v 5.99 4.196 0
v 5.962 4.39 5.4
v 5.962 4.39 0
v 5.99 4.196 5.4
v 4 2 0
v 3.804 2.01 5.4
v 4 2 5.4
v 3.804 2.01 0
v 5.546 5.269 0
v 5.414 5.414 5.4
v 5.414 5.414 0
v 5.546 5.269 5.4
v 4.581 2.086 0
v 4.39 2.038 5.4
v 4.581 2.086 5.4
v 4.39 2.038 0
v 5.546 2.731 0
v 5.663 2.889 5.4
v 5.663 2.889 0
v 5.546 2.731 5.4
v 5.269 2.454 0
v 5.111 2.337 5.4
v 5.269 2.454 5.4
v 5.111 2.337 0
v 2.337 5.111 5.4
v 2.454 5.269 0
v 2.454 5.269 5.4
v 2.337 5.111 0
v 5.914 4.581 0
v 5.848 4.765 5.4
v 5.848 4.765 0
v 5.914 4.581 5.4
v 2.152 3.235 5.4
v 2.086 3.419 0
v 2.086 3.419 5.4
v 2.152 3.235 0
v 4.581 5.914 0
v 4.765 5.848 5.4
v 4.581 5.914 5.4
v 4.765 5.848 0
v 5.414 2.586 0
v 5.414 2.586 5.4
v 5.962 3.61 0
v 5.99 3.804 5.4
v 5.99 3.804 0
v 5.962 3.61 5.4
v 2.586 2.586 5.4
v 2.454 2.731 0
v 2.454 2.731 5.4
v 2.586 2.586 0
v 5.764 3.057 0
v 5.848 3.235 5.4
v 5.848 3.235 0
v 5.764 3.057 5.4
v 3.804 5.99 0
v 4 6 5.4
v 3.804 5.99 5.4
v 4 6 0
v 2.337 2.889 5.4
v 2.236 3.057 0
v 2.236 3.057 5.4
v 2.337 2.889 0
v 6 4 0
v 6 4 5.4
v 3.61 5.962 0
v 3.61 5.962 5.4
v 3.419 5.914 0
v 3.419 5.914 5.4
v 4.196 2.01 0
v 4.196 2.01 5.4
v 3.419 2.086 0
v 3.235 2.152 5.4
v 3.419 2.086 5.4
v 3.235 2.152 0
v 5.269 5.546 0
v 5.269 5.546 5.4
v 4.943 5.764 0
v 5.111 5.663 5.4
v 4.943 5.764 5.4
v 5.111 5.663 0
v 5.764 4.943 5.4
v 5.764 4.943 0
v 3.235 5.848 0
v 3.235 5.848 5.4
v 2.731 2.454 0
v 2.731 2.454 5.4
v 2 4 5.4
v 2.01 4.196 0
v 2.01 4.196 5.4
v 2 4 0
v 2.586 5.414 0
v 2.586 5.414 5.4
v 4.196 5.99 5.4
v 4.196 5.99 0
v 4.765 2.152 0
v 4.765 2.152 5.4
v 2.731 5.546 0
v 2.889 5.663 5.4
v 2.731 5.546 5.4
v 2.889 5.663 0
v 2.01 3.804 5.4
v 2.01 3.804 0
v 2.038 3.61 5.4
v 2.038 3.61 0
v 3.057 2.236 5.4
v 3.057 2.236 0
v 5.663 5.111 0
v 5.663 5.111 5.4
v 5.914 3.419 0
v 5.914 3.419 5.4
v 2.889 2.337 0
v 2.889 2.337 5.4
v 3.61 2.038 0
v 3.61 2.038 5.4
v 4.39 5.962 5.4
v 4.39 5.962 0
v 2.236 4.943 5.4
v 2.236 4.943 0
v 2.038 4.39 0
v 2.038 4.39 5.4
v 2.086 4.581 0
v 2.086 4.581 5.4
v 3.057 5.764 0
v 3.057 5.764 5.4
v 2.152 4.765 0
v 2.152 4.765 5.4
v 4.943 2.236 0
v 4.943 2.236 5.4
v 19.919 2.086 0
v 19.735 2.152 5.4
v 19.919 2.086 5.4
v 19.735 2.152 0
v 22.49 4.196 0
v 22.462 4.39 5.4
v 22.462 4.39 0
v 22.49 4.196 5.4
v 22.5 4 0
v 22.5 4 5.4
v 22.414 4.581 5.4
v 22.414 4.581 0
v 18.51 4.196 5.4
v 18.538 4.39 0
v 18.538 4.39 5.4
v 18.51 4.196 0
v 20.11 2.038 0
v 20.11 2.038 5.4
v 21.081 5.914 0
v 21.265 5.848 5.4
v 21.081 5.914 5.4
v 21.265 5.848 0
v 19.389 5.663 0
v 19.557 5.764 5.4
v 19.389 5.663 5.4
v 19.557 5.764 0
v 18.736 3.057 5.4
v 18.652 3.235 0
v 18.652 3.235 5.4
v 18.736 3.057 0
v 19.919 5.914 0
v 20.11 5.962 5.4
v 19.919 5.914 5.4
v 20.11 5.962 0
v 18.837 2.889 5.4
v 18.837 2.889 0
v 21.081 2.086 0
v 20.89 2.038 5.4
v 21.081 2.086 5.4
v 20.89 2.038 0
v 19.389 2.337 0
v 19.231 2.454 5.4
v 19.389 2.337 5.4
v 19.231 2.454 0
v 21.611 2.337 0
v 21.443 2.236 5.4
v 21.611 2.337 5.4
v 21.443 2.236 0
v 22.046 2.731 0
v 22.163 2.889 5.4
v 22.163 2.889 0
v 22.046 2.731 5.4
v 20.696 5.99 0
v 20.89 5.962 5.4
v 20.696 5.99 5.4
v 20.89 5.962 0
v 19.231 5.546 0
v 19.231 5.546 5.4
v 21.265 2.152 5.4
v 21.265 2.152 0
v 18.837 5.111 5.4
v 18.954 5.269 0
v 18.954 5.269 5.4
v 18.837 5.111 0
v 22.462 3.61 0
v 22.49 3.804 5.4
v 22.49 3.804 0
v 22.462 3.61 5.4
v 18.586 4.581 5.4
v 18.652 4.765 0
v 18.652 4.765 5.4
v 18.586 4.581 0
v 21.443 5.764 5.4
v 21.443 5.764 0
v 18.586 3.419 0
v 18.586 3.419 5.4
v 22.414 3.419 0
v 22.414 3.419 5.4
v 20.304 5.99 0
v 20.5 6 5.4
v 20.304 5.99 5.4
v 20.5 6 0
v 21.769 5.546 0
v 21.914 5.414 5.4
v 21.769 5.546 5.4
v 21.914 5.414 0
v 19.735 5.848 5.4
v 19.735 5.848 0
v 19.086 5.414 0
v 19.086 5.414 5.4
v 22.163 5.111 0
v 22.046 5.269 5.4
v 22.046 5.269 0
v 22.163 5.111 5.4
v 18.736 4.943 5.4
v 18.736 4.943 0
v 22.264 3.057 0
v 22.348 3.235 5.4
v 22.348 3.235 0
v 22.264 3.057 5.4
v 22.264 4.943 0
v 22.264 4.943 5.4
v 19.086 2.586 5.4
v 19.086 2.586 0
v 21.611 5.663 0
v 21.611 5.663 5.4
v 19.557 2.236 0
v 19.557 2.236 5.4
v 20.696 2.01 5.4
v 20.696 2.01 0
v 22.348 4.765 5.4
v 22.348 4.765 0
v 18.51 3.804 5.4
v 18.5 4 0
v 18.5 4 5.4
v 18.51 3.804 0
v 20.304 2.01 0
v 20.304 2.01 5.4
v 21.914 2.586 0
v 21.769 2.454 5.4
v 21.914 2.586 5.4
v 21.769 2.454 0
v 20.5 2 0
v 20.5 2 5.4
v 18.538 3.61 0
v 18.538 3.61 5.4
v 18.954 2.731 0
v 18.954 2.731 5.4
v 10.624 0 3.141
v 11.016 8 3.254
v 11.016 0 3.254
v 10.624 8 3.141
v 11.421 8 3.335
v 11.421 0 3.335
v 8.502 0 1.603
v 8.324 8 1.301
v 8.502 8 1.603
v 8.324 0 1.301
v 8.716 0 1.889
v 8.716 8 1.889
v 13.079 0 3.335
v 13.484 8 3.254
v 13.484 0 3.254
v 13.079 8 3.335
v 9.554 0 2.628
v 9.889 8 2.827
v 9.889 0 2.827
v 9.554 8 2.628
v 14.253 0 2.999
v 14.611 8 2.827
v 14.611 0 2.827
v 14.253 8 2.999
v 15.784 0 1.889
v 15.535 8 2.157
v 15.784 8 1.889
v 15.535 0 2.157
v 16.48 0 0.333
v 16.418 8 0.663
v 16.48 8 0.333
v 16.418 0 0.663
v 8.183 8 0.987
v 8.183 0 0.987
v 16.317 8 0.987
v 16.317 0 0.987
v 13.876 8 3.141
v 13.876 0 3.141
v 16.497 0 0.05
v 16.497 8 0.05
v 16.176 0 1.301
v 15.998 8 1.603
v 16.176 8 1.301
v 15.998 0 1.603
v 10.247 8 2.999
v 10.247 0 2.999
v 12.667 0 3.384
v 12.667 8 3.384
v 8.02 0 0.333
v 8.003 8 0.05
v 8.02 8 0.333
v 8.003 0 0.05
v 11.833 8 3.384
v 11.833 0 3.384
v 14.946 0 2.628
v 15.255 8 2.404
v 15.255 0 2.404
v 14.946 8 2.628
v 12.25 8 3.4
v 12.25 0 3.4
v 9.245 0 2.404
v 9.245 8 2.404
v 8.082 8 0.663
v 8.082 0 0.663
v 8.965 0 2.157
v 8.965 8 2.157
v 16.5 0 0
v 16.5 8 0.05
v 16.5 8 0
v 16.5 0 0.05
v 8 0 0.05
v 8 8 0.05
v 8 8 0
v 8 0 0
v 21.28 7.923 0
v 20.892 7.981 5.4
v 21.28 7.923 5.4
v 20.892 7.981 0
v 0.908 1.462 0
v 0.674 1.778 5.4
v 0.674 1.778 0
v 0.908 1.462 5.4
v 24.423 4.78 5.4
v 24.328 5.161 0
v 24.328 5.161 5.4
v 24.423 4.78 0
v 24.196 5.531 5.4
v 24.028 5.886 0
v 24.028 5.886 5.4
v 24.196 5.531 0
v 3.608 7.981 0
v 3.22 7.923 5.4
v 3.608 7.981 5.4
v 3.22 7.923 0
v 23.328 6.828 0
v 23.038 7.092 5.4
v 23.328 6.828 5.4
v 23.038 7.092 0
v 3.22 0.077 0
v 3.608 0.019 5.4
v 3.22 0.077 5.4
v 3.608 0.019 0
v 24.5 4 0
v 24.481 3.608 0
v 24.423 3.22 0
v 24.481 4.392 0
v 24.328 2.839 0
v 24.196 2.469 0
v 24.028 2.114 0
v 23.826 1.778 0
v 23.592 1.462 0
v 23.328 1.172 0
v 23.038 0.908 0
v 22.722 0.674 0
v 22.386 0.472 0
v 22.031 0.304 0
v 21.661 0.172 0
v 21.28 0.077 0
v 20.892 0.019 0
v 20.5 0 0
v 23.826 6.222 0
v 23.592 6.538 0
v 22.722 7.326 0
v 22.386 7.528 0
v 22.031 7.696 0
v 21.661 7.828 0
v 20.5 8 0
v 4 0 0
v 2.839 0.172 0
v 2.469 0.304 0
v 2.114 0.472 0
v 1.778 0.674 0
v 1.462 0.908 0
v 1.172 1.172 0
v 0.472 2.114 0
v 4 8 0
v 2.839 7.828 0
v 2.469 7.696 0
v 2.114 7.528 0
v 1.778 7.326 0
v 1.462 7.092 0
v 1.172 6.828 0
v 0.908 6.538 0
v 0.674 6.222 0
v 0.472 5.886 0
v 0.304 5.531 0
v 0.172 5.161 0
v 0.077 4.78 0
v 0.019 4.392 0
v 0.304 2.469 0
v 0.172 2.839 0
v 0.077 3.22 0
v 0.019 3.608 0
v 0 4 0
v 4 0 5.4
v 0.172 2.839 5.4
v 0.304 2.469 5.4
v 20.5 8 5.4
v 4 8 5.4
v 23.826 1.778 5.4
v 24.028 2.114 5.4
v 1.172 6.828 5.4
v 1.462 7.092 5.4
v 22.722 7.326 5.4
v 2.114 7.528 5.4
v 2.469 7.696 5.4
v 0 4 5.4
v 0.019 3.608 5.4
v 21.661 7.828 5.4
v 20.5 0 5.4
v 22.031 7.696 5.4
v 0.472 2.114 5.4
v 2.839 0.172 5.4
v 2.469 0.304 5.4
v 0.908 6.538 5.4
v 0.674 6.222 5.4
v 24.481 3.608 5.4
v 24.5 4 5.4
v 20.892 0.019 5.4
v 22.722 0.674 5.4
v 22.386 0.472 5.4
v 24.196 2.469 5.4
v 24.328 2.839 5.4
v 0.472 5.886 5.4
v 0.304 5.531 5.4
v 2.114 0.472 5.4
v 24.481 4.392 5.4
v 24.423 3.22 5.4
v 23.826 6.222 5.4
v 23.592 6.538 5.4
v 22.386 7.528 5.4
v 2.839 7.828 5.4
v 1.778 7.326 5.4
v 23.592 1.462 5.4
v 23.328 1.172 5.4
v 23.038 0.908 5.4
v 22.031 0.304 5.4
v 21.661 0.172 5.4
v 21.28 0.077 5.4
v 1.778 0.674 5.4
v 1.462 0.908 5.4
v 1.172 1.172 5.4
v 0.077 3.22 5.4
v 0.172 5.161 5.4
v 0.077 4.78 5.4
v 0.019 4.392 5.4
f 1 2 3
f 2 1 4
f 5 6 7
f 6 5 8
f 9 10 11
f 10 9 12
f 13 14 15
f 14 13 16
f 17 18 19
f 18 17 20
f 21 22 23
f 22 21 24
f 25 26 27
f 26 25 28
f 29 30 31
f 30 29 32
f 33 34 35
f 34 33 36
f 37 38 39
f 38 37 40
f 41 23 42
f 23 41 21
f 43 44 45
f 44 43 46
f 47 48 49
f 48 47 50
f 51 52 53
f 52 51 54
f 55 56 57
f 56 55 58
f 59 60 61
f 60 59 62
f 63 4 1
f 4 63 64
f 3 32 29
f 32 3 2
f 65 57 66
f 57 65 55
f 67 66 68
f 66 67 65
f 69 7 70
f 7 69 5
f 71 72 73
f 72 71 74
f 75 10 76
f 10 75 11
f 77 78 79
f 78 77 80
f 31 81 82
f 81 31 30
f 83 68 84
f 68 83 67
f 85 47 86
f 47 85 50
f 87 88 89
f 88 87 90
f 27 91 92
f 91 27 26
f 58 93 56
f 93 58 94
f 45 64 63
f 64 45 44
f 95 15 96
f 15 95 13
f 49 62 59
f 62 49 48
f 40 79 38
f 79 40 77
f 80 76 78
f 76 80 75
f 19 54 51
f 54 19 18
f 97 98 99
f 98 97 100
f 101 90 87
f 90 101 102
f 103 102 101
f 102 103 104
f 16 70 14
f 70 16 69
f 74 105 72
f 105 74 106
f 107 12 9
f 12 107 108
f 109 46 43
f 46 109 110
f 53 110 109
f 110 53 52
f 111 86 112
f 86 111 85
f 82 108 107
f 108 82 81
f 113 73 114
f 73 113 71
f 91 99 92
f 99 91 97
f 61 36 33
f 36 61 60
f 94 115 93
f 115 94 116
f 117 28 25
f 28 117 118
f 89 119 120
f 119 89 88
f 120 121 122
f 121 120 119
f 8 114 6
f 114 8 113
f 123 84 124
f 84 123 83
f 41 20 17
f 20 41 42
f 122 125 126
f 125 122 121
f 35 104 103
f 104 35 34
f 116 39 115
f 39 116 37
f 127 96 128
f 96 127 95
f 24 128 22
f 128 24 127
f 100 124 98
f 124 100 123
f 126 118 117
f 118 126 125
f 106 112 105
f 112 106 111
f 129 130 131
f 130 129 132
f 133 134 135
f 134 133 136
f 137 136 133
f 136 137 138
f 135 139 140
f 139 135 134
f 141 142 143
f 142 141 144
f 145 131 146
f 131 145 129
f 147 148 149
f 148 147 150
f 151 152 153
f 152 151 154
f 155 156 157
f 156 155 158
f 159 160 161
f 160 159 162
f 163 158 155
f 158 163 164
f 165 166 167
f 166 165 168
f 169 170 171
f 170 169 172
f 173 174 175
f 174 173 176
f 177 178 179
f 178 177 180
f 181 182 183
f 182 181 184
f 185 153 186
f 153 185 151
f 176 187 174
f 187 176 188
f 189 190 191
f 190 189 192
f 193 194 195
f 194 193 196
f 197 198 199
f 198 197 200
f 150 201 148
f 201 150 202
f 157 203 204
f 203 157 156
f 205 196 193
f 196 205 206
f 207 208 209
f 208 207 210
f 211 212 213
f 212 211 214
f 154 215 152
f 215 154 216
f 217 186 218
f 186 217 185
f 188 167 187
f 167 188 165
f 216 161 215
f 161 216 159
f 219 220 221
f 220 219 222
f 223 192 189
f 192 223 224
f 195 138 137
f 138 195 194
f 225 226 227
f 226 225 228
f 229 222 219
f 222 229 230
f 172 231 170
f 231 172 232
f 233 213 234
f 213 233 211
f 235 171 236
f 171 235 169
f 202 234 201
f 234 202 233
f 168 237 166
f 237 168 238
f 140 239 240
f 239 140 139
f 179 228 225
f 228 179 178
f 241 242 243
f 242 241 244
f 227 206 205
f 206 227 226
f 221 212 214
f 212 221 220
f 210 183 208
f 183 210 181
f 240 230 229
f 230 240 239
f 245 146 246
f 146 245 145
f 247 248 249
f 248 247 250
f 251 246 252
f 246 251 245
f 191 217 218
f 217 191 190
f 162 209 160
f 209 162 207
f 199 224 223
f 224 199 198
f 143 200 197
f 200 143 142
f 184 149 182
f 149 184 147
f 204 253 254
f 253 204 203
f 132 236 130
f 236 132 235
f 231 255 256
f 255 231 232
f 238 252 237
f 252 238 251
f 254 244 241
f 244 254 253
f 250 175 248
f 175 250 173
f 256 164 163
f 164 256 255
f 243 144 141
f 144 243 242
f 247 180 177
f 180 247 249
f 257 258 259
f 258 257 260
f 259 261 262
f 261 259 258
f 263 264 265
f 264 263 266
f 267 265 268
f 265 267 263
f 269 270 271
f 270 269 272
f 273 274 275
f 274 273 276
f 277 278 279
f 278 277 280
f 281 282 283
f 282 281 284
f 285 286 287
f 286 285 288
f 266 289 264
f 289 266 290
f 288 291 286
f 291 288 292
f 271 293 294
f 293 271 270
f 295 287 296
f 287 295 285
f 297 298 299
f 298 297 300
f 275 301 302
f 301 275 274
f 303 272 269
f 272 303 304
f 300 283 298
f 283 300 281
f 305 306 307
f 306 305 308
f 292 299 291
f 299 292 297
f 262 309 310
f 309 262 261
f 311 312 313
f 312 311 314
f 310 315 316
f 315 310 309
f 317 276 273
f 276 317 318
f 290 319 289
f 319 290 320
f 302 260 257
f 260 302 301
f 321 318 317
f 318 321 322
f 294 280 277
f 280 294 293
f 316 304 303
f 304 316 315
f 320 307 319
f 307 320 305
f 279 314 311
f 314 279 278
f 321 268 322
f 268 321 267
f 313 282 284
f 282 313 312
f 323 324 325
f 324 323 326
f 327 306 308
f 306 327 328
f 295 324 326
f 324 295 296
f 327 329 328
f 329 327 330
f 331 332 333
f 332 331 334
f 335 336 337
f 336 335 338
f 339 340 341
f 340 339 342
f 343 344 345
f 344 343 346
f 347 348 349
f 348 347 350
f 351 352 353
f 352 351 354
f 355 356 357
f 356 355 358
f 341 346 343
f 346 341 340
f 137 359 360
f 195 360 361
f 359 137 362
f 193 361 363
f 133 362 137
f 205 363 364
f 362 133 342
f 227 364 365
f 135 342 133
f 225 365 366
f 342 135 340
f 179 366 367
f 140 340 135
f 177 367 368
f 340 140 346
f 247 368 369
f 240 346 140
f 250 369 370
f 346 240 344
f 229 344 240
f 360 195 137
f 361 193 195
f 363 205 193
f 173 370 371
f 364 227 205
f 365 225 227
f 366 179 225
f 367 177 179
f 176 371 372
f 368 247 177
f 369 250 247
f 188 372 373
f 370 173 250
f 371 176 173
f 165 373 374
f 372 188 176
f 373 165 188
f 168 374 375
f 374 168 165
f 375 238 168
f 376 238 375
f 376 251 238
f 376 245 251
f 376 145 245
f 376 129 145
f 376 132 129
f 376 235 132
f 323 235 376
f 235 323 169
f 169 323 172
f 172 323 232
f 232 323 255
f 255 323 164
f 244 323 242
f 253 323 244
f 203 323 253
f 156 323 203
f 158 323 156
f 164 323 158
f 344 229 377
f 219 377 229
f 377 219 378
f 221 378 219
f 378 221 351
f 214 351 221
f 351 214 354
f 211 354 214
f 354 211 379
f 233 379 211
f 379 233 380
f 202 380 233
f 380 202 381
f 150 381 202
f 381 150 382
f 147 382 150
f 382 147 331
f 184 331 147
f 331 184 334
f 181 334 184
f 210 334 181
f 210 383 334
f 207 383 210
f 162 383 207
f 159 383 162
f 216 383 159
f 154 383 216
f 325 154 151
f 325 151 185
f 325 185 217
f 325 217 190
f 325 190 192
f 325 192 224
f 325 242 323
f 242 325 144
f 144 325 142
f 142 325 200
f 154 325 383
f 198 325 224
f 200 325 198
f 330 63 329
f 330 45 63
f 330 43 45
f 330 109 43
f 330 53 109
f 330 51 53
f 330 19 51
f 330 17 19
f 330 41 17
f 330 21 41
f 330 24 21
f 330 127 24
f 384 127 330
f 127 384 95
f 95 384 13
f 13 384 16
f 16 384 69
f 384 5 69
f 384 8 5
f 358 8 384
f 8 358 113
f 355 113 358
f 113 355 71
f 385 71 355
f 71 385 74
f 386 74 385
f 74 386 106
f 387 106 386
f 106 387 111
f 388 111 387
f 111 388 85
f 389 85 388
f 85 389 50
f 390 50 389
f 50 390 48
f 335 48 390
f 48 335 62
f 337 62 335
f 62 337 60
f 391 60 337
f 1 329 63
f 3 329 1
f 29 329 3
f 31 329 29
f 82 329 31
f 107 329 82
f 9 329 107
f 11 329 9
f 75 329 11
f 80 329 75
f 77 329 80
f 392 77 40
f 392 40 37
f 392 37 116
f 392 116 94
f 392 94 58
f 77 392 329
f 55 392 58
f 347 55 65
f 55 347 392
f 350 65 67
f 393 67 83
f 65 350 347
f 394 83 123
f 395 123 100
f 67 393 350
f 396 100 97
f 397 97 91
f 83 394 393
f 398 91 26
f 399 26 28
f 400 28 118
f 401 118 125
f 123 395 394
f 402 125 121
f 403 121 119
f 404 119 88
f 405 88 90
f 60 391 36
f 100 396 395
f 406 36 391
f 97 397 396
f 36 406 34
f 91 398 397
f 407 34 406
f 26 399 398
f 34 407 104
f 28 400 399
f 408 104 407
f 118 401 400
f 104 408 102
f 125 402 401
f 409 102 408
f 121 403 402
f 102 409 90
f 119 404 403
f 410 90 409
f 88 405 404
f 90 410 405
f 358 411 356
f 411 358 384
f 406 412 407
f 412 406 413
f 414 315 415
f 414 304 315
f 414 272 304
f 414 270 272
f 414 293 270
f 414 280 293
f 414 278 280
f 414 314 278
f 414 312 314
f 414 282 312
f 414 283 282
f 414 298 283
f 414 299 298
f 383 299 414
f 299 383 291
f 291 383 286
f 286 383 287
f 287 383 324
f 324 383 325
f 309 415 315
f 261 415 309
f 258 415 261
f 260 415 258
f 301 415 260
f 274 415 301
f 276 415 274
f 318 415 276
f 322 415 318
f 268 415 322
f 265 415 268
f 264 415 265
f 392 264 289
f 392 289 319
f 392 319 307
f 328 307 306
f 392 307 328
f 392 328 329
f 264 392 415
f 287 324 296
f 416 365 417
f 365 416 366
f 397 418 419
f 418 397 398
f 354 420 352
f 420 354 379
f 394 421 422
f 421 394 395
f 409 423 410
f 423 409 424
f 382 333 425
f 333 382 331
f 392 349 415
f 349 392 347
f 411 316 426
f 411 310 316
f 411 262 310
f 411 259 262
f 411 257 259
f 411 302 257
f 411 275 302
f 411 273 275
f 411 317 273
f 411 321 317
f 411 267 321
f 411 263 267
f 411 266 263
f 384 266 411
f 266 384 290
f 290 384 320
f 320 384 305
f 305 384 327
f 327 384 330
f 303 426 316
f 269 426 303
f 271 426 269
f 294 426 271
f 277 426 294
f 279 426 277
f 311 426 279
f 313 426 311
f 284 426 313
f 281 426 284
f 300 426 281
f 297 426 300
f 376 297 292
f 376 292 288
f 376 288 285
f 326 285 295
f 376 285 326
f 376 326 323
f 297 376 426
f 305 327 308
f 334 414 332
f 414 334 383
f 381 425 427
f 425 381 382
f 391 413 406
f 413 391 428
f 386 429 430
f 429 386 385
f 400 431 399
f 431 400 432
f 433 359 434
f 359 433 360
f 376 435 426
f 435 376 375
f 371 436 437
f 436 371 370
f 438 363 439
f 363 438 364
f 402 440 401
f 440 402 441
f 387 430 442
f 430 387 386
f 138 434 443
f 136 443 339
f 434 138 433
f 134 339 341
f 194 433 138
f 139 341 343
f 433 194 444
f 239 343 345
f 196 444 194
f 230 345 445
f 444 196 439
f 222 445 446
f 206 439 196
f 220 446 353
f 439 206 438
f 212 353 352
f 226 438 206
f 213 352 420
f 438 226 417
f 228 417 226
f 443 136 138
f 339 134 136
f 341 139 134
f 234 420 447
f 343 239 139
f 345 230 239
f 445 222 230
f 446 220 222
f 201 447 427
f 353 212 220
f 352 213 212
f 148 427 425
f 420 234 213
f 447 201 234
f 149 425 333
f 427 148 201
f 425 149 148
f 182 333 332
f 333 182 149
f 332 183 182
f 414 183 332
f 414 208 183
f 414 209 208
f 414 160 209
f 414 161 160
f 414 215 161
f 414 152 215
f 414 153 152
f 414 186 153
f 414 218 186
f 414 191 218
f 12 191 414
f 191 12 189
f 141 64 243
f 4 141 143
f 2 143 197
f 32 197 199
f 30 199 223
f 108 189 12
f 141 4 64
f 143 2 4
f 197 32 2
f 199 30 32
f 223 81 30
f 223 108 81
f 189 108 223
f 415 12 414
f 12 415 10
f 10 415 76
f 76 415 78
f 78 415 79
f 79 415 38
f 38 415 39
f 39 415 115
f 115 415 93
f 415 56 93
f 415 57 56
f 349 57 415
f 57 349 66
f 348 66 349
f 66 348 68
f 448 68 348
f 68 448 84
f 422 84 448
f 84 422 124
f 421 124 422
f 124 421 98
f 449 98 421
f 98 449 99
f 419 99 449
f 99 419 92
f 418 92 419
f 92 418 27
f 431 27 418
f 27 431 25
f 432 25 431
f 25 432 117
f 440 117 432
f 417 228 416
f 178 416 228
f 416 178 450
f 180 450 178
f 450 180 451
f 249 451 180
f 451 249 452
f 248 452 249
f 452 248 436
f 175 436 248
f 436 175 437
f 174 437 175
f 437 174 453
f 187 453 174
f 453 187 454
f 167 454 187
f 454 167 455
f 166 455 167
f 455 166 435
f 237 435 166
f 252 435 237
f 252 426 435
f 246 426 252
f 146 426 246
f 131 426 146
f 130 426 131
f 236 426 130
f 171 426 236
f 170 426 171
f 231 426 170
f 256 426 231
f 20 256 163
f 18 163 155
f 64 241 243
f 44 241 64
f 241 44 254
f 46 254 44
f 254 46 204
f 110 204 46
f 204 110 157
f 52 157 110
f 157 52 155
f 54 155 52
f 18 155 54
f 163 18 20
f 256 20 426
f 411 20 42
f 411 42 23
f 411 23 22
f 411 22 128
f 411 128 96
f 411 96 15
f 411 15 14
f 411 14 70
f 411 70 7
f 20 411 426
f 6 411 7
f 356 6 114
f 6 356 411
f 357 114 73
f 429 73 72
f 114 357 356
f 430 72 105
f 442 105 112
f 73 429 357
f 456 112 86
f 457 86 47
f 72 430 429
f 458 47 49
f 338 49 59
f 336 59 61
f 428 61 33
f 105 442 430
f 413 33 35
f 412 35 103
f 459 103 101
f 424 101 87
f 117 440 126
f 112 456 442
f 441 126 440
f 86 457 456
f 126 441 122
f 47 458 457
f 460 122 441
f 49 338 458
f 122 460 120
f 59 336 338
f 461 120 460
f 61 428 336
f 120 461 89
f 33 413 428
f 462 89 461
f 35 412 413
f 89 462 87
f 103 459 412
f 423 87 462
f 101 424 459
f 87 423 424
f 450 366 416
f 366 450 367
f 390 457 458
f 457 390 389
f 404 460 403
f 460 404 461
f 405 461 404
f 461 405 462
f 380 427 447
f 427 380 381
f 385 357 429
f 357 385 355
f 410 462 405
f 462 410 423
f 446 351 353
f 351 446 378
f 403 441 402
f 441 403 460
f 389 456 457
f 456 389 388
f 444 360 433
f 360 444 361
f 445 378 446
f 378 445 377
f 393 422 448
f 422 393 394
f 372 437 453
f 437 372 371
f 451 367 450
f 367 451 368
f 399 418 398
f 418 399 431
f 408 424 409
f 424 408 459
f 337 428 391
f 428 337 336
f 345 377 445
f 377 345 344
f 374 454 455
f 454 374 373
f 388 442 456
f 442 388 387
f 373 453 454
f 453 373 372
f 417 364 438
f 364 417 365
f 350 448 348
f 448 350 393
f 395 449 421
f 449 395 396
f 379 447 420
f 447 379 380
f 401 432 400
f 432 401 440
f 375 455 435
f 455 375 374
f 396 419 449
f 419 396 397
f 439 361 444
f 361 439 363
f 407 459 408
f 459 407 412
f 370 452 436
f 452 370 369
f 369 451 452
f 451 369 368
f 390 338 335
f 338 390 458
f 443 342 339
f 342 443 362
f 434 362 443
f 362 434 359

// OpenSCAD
/* [Basics] */
// - Size in diameter.
ScrewHole       = 4;
// - The width of the hole. To change the height, change Advanced->CableHoleRatio
CableHole       = 8.5;
// - Rotate the model for easyer print
RotateModel   = 0; // [1:Yes,0:No]

/* [Advanced] */
// - The amount of roof above the cable hole.
RoofHeight      = 2;
// - The amount of extra feet-height.
ExtraFeetHeight = 0;
// - Adds extra depth.
AddDepth        = 0;
// - The size of the walls around the screw holes.
WallThickness   = 2;
// - Change the roundness of the cable hole
CableHoleRatio  = 1.25;
// - Change the height of the hole. If 0 the model will be calculated through the Cable Hole Ratio
CableHoleHeight = 0;


/* Variables */
tCableHoleHeight = CableHoleHeight > 0 ? CableHoleHeight : CableHole / CableHoleRatio;
echo(tCableHoleHeight);
tWidth  = CableHole + ScrewHole*2 + WallThickness*4; //X
tDepth  = ScrewHole + WallThickness * 2; //Y
tHeight = tCableHoleHeight/2 + RoofHeight + ExtraFeetHeight; //Z
tCornerRadio = tDepth/2;

difference() {
   roundedCube(tWidth, tDepth, tHeight, tCornerRadio);
   if (RotateModel) {
        translate([0,tDepth,tHeight])
        rotate([180, 0, 0])
        cutouts();
   } else {
       cutouts();
   }
}


module roundedCube(){
    $fn=64;

    hull(){
        //LB Ring
        translate([tCornerRadio,tCornerRadio, 0])
            cylinder(r=tCornerRadio, h=tHeight);
        //RB Ring
        translate([tWidth-tCornerRadio,tCornerRadio, 0])
            cylinder(r=tCornerRadio, h=tHeight);
        //LT Ring
        translate([tCornerRadio, tDepth-tCornerRadio + AddDepth, 0])
            cylinder(r=tCornerRadio, h=tHeight);
        //RT Ring
        translate([tWidth-tCornerRadio, tDepth-tCornerRadio + AddDepth, 0])
            cylinder(r=tCornerRadio, h=tHeight);
    }
}

module cutouts() {
    $fn=64;
    pad = 0.1; // Padding to maintain manifold

    translate([ScrewHole/2+WallThickness, ScrewHole/2+WallThickness+AddDepth/2, -pad/2])
    cylinder(h=tHeight+pad, r=ScrewHole/2);
    
    translate([tWidth-ScrewHole/2-WallThickness, ScrewHole/2+WallThickness+AddDepth/2, -pad/2])
    cylinder(h=tHeight+pad, r=ScrewHole/2);
    
    rotate([-90, 0, 0])
    translate([ScrewHole+WallThickness*2+CableHole/2, -ExtraFeetHeight, -pad/2])
    resize([CableHole,tCableHoleHeight, tDepth+pad])
    cylinder(1);
    translate([ScrewHole+WallThickness*2, -pad/2, -pad/2])
    cube([CableHole,tDepth+pad,ExtraFeetHeight+pad]);
}
